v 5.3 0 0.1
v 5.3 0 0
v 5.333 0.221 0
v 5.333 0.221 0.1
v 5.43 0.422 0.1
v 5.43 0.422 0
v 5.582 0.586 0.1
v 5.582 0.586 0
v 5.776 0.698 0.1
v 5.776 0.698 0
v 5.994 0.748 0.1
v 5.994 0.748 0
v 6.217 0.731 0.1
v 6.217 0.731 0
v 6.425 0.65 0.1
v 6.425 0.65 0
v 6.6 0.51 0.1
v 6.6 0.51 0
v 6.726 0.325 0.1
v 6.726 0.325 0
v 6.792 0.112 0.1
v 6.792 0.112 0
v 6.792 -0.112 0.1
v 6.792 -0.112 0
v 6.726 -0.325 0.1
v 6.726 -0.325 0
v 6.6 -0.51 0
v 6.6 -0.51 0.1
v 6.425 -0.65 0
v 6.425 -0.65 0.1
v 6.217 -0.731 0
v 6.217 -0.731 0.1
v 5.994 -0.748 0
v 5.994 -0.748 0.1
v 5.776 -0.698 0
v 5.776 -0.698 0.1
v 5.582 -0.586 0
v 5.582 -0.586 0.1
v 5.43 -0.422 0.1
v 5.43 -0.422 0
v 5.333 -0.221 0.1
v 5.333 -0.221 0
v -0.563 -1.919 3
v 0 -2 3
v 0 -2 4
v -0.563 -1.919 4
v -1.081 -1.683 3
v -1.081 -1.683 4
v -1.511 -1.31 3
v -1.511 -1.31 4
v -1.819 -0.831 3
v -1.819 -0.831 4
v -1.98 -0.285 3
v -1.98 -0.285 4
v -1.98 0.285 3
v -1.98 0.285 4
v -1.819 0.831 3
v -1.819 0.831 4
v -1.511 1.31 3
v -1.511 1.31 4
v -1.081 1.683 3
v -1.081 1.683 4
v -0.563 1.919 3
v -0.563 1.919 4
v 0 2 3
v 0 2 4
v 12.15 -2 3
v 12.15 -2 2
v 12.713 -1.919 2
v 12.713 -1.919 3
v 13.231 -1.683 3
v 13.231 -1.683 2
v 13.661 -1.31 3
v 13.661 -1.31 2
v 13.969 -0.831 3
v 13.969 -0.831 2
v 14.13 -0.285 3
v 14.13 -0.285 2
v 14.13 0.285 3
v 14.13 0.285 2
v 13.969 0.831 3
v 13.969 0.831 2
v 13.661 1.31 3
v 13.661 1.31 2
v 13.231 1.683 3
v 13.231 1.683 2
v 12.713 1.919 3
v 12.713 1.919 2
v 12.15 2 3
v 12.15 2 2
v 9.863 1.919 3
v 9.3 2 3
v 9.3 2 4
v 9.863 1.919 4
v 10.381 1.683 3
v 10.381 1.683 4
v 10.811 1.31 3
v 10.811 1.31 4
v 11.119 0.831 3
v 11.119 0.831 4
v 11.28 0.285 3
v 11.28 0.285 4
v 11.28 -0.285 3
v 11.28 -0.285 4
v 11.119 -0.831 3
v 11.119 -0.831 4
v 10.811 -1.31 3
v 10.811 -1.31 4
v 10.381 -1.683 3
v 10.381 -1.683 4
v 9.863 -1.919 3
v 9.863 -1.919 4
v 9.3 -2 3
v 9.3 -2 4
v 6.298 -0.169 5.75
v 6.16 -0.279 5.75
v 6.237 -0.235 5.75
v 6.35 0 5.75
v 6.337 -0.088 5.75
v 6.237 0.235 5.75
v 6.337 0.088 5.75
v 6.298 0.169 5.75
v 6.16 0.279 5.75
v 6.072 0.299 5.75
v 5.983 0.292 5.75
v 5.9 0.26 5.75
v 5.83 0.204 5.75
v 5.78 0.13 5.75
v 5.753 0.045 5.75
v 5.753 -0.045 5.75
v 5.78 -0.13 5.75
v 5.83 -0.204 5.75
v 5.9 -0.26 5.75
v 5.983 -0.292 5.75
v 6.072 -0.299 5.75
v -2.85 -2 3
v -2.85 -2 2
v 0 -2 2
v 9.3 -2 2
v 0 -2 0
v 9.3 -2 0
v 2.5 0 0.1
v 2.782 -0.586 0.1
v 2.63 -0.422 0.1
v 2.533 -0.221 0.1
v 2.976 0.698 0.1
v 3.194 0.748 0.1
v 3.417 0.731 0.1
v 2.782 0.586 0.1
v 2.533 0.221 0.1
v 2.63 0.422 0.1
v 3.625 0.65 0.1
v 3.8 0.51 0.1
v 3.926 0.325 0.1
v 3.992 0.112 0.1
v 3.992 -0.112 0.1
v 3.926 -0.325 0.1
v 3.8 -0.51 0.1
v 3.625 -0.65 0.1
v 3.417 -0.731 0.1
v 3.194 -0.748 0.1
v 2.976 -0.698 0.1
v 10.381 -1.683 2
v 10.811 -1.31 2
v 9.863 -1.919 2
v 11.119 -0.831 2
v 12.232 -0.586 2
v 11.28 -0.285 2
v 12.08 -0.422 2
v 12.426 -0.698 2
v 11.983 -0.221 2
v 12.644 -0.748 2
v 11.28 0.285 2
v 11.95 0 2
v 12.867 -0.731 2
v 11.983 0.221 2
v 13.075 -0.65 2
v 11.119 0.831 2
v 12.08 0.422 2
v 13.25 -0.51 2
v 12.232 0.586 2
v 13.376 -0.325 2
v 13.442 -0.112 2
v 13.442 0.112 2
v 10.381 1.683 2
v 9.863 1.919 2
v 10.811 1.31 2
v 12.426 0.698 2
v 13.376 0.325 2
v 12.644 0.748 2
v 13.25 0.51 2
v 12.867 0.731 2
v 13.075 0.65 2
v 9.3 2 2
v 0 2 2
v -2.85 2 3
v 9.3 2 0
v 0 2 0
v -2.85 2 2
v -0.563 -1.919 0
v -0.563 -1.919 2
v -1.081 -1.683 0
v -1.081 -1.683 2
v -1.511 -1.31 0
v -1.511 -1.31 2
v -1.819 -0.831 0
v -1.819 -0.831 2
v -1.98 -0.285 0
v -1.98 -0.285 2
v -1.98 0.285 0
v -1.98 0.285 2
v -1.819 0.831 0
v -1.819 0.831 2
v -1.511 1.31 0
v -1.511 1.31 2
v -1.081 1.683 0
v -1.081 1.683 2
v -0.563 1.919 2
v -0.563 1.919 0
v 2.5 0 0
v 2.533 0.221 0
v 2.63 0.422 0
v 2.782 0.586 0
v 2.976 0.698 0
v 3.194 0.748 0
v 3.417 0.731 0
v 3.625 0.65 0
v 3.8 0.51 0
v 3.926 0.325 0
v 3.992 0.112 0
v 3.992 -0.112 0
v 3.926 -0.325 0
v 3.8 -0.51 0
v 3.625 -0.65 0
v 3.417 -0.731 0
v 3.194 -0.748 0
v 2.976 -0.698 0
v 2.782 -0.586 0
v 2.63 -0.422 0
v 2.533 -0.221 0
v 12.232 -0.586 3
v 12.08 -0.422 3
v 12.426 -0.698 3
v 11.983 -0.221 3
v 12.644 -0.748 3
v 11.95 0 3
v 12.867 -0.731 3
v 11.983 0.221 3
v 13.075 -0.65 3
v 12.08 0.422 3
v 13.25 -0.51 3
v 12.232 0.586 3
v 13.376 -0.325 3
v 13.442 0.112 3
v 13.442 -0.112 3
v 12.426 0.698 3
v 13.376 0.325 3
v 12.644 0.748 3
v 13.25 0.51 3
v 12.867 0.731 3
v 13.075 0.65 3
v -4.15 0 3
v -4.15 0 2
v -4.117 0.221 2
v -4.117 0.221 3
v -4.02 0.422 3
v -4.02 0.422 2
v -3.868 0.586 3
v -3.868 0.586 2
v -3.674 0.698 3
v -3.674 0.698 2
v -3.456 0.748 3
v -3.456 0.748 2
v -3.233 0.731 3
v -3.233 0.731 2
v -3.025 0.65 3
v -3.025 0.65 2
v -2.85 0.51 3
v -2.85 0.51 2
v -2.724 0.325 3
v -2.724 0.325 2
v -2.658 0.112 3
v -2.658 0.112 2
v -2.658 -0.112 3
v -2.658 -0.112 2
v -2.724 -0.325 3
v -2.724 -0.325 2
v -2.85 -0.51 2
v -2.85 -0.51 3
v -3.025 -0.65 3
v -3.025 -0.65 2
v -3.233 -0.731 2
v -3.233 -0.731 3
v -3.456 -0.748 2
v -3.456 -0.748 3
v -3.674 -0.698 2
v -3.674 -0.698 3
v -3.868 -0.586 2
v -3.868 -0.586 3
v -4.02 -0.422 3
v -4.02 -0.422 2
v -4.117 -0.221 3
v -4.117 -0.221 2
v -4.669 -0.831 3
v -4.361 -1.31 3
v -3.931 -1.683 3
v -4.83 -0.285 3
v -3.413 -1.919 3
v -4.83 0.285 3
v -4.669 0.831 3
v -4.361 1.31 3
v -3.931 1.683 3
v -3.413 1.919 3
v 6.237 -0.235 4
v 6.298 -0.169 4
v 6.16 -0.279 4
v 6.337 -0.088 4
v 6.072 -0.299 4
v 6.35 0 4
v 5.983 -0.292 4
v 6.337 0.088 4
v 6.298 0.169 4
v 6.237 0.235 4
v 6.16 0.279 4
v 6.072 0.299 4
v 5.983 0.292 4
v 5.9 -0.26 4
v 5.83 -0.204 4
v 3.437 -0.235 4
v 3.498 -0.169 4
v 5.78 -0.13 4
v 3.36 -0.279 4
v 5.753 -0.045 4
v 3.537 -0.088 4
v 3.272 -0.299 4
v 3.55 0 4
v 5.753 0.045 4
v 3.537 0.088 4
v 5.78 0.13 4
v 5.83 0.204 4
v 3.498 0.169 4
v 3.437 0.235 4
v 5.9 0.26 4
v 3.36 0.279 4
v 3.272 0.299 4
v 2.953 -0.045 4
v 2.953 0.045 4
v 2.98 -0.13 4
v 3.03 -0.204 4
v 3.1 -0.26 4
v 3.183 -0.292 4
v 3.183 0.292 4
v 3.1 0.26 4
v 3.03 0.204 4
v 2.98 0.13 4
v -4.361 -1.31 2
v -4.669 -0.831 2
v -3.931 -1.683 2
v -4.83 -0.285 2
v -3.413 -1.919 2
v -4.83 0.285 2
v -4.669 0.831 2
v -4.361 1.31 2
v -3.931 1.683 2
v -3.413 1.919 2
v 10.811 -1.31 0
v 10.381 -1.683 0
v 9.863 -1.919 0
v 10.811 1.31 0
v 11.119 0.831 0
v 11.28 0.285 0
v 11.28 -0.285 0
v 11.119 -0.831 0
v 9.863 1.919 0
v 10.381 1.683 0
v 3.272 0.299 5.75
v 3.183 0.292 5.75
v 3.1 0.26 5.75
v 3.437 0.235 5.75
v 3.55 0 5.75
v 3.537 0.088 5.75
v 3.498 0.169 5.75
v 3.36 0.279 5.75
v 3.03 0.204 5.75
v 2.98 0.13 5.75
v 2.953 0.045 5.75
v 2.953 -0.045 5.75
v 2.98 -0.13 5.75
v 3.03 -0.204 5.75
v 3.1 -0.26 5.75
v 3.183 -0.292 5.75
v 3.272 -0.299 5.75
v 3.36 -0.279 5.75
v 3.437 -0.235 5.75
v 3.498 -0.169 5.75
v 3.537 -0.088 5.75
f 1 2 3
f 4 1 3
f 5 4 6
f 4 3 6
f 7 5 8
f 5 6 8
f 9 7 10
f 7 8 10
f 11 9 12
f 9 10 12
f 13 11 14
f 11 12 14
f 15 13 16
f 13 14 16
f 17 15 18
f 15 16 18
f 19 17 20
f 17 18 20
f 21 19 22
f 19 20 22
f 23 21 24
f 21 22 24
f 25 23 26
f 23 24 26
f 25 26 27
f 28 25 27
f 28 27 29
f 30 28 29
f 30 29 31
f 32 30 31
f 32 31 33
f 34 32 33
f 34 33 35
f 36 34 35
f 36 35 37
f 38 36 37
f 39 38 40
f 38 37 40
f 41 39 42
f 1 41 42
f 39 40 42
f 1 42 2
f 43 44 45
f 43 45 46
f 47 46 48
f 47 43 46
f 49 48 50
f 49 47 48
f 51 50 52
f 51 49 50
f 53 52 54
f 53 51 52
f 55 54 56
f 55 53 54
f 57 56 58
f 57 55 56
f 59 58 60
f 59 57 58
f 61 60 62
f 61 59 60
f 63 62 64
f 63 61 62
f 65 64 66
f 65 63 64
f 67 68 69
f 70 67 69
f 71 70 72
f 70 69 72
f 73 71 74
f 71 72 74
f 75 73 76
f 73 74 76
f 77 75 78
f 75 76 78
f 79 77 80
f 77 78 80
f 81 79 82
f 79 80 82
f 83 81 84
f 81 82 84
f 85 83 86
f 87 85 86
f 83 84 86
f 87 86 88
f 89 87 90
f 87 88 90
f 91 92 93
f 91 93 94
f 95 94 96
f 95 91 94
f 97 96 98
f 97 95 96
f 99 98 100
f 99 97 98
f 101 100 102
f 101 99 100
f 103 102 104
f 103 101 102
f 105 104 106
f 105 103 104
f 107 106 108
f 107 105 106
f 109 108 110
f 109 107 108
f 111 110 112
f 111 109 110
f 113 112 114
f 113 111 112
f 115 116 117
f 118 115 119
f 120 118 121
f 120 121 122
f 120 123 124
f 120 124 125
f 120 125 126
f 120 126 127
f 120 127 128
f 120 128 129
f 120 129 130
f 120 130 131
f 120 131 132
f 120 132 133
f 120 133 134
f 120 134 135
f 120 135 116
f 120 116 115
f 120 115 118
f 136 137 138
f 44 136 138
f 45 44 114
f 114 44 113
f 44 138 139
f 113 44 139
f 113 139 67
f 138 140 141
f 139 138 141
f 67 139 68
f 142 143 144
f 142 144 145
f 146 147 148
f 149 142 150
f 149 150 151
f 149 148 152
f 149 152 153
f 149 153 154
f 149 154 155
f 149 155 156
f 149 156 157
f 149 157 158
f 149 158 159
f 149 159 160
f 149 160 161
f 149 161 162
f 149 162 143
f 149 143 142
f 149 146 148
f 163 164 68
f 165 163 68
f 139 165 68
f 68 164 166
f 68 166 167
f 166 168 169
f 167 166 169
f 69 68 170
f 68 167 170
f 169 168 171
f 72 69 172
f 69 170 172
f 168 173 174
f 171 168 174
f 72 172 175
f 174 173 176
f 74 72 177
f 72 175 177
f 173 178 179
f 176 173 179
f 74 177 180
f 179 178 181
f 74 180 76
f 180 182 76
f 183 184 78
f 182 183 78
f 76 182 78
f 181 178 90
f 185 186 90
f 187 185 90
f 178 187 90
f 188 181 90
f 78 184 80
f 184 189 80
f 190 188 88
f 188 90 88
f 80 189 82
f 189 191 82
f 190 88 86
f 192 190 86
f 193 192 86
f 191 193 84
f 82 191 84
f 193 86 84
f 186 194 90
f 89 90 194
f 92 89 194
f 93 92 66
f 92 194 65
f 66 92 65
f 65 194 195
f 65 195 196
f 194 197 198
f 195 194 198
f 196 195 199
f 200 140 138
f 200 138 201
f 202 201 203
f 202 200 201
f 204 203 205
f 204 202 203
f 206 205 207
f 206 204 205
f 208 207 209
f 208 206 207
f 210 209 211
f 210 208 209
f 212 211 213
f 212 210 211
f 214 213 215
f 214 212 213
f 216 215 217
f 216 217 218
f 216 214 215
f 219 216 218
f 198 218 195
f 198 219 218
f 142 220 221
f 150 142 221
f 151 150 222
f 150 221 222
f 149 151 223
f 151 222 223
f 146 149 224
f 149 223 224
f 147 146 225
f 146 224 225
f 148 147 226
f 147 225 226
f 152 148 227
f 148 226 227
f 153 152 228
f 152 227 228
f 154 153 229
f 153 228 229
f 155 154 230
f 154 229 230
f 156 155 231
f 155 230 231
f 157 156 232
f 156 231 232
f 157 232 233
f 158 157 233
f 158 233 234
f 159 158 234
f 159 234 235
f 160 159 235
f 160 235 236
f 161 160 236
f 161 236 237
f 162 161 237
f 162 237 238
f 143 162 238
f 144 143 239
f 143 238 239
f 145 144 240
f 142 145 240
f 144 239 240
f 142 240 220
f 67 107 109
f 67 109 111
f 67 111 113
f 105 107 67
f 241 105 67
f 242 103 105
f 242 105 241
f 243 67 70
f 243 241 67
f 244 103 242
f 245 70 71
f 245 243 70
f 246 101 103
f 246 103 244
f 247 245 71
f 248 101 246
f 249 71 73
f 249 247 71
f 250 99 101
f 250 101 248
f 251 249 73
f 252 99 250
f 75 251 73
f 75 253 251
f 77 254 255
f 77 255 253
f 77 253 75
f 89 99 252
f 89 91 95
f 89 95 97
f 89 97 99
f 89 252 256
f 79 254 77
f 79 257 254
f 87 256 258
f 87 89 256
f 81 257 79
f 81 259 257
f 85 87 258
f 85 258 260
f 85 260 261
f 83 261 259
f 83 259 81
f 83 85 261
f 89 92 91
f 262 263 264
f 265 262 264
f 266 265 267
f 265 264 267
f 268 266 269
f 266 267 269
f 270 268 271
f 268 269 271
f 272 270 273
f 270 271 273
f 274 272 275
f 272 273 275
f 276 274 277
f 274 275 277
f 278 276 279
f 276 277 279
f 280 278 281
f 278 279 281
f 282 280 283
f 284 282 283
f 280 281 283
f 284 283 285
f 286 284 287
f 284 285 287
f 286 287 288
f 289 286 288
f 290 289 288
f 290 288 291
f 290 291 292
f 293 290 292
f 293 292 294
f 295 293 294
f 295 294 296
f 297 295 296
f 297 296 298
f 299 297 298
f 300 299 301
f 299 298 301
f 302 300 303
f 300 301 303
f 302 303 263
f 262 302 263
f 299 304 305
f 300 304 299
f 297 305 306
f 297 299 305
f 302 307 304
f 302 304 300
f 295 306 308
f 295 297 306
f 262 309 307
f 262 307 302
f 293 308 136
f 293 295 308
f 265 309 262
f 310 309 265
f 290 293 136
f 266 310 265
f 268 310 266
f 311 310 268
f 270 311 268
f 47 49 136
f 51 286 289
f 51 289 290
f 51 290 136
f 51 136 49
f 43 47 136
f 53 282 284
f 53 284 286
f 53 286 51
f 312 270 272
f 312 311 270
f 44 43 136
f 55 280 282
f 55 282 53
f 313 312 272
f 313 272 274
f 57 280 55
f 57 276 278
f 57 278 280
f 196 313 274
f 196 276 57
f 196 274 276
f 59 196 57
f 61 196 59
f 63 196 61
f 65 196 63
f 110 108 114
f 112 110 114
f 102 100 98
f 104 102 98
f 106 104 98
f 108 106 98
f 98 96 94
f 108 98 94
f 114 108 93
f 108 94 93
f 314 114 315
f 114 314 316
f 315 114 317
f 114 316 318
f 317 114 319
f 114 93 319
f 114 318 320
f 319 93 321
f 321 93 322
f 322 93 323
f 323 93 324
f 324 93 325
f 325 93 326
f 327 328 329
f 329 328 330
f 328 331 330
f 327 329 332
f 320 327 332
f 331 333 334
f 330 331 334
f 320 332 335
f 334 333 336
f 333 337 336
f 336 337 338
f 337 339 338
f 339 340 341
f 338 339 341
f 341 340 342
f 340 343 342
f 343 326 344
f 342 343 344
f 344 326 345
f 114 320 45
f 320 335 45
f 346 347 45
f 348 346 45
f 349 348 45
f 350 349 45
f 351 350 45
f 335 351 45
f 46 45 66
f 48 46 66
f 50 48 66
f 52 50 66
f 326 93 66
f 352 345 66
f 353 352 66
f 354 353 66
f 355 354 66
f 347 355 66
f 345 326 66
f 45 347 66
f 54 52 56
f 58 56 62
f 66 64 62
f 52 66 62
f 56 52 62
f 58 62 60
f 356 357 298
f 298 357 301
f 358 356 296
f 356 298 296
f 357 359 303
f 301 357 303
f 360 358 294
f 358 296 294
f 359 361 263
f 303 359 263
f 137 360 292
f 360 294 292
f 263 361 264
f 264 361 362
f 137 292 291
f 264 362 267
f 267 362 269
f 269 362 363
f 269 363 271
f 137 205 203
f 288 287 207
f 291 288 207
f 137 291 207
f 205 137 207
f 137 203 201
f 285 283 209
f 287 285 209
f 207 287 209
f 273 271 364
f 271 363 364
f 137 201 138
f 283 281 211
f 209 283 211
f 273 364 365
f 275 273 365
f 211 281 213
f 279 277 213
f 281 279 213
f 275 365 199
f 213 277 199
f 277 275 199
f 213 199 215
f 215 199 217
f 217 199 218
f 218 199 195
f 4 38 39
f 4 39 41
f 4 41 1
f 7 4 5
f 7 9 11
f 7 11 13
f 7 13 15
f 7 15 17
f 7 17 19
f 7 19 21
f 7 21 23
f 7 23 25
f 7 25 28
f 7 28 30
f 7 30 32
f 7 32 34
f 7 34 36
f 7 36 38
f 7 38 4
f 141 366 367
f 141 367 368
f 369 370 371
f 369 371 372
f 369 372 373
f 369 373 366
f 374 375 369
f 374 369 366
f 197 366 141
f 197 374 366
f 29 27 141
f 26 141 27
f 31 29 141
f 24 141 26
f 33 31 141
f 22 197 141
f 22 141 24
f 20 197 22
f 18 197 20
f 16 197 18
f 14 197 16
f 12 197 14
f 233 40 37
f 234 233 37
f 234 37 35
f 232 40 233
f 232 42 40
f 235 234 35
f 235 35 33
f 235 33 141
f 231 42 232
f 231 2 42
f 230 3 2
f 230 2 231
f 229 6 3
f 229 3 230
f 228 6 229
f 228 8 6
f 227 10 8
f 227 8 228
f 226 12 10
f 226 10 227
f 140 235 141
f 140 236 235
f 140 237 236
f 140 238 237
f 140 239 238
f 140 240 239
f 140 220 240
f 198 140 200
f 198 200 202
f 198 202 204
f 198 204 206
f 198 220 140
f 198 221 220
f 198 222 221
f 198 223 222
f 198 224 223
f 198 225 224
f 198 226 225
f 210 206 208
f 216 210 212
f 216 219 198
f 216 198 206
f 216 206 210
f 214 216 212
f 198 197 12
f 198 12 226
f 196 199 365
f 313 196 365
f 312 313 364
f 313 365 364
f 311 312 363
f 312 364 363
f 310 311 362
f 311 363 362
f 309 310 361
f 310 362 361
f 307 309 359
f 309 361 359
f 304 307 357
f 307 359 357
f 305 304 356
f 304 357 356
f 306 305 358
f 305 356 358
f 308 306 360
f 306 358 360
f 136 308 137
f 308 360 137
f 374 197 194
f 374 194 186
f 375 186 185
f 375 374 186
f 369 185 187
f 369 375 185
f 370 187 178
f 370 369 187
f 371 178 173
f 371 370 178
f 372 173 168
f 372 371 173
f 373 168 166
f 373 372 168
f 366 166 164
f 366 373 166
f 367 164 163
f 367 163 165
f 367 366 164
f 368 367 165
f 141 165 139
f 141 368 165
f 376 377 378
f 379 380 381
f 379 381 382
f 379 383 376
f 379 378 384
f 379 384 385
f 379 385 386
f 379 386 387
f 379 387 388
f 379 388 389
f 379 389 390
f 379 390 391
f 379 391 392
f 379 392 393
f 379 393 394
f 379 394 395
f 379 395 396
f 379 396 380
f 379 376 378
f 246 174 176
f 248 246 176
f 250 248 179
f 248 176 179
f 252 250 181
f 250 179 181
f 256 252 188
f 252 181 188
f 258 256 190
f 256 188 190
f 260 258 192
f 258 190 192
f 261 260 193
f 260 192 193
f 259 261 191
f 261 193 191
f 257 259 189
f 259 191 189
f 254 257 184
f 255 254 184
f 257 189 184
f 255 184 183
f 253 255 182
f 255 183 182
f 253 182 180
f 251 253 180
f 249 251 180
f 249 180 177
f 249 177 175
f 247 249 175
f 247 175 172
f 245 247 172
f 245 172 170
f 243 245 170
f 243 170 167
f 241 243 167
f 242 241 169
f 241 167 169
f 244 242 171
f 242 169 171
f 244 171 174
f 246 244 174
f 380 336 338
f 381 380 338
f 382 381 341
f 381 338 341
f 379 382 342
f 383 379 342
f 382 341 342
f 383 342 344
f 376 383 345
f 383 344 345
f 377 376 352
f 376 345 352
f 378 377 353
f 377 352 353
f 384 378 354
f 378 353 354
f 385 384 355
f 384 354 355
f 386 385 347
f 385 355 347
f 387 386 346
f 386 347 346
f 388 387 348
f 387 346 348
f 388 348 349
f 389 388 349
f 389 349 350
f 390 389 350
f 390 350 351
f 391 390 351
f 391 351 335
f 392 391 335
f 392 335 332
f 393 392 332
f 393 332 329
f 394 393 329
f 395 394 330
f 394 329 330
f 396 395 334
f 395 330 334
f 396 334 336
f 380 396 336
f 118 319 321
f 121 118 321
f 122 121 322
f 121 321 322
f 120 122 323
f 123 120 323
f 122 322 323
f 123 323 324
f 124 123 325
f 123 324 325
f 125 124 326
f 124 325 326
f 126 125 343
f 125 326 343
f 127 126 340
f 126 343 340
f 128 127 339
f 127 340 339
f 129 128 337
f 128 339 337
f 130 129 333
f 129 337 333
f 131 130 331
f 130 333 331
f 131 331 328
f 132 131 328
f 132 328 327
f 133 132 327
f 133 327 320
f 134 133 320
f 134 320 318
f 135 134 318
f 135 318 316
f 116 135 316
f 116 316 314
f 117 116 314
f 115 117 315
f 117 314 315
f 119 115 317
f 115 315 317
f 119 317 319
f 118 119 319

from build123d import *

# Parameters (mm, degrees)
EXTRUDE_1_DEPTH     = 4
EXTRUDE_START       = -2
SKETCH_2_R          = 0.75
EXTRUDE_2_DEPTH     = 1
SKETCH_3_R          = 0.75
CUT_EXTRUDE_1_DEPTH = 0.1
SKETCH_4_R          = 0.3
EXTRUDE_3_DEPTH     = 1.75


with BuildPart() as part:
    # 草图1 → 凸台-拉伸1 (new body)
    with BuildSketch(Plane.XY):
        with BuildLine():
            Line((0, 2), (9.3, 2))
            ThreePointArc((9.3, 2), (11.3, 0), (9.3, -2))
            Line((9.3, -2), (0, -2))
            ThreePointArc((0, -2), (-2, 0), (0, 2))
        make_face()
    extrude(amount=EXTRUDE_1_DEPTH)

    # 草图2 → 凸台-拉伸2 (add)
    with BuildSketch(Plane(origin=(0, 0, 0), x_dir=(-1, 0, 0), z_dir=(0, 0, -1)).offset(EXTRUDE_START)):
        with BuildLine():
            Line((-12.15, 2), (2.85, 2))
            ThreePointArc((2.85, 2), (4.85, 0), (2.85, -2))
            Line((2.85, -2), (-12.15, -2))
            ThreePointArc((-12.15, -2), (-14.15, 0), (-12.15, 2))
        make_face()
        with Locations((-12.7, 0)):
            Circle(SKETCH_2_R, mode=Mode.SUBTRACT)
        with Locations((3.4, 0)):
            Circle(SKETCH_2_R, mode=Mode.SUBTRACT)
    extrude(amount=-EXTRUDE_2_DEPTH)

    # 草图3 → 切除-拉伸1 (cut)
    with BuildSketch(Plane(origin=(0, 0, 0), x_dir=(-1, 0, 0), z_dir=(0, 0, -1))):
        with Locations((-6.05, 0)):
            Circle(SKETCH_3_R)
        with Locations((-3.25, 0)):
            Circle(SKETCH_3_R)
    extrude(amount=-CUT_EXTRUDE_1_DEPTH, mode=Mode.SUBTRACT)

    # 草图4 → 凸台-拉伸3 (add)
    with BuildSketch(Plane.XY.offset(4)):
        with Locations((3.25, 0)):
            Circle(SKETCH_4_R)
        with Locations((6.05, 0)):
            Circle(SKETCH_4_R)
    extrude(amount=EXTRUDE_3_DEPTH)


solid = part.part
